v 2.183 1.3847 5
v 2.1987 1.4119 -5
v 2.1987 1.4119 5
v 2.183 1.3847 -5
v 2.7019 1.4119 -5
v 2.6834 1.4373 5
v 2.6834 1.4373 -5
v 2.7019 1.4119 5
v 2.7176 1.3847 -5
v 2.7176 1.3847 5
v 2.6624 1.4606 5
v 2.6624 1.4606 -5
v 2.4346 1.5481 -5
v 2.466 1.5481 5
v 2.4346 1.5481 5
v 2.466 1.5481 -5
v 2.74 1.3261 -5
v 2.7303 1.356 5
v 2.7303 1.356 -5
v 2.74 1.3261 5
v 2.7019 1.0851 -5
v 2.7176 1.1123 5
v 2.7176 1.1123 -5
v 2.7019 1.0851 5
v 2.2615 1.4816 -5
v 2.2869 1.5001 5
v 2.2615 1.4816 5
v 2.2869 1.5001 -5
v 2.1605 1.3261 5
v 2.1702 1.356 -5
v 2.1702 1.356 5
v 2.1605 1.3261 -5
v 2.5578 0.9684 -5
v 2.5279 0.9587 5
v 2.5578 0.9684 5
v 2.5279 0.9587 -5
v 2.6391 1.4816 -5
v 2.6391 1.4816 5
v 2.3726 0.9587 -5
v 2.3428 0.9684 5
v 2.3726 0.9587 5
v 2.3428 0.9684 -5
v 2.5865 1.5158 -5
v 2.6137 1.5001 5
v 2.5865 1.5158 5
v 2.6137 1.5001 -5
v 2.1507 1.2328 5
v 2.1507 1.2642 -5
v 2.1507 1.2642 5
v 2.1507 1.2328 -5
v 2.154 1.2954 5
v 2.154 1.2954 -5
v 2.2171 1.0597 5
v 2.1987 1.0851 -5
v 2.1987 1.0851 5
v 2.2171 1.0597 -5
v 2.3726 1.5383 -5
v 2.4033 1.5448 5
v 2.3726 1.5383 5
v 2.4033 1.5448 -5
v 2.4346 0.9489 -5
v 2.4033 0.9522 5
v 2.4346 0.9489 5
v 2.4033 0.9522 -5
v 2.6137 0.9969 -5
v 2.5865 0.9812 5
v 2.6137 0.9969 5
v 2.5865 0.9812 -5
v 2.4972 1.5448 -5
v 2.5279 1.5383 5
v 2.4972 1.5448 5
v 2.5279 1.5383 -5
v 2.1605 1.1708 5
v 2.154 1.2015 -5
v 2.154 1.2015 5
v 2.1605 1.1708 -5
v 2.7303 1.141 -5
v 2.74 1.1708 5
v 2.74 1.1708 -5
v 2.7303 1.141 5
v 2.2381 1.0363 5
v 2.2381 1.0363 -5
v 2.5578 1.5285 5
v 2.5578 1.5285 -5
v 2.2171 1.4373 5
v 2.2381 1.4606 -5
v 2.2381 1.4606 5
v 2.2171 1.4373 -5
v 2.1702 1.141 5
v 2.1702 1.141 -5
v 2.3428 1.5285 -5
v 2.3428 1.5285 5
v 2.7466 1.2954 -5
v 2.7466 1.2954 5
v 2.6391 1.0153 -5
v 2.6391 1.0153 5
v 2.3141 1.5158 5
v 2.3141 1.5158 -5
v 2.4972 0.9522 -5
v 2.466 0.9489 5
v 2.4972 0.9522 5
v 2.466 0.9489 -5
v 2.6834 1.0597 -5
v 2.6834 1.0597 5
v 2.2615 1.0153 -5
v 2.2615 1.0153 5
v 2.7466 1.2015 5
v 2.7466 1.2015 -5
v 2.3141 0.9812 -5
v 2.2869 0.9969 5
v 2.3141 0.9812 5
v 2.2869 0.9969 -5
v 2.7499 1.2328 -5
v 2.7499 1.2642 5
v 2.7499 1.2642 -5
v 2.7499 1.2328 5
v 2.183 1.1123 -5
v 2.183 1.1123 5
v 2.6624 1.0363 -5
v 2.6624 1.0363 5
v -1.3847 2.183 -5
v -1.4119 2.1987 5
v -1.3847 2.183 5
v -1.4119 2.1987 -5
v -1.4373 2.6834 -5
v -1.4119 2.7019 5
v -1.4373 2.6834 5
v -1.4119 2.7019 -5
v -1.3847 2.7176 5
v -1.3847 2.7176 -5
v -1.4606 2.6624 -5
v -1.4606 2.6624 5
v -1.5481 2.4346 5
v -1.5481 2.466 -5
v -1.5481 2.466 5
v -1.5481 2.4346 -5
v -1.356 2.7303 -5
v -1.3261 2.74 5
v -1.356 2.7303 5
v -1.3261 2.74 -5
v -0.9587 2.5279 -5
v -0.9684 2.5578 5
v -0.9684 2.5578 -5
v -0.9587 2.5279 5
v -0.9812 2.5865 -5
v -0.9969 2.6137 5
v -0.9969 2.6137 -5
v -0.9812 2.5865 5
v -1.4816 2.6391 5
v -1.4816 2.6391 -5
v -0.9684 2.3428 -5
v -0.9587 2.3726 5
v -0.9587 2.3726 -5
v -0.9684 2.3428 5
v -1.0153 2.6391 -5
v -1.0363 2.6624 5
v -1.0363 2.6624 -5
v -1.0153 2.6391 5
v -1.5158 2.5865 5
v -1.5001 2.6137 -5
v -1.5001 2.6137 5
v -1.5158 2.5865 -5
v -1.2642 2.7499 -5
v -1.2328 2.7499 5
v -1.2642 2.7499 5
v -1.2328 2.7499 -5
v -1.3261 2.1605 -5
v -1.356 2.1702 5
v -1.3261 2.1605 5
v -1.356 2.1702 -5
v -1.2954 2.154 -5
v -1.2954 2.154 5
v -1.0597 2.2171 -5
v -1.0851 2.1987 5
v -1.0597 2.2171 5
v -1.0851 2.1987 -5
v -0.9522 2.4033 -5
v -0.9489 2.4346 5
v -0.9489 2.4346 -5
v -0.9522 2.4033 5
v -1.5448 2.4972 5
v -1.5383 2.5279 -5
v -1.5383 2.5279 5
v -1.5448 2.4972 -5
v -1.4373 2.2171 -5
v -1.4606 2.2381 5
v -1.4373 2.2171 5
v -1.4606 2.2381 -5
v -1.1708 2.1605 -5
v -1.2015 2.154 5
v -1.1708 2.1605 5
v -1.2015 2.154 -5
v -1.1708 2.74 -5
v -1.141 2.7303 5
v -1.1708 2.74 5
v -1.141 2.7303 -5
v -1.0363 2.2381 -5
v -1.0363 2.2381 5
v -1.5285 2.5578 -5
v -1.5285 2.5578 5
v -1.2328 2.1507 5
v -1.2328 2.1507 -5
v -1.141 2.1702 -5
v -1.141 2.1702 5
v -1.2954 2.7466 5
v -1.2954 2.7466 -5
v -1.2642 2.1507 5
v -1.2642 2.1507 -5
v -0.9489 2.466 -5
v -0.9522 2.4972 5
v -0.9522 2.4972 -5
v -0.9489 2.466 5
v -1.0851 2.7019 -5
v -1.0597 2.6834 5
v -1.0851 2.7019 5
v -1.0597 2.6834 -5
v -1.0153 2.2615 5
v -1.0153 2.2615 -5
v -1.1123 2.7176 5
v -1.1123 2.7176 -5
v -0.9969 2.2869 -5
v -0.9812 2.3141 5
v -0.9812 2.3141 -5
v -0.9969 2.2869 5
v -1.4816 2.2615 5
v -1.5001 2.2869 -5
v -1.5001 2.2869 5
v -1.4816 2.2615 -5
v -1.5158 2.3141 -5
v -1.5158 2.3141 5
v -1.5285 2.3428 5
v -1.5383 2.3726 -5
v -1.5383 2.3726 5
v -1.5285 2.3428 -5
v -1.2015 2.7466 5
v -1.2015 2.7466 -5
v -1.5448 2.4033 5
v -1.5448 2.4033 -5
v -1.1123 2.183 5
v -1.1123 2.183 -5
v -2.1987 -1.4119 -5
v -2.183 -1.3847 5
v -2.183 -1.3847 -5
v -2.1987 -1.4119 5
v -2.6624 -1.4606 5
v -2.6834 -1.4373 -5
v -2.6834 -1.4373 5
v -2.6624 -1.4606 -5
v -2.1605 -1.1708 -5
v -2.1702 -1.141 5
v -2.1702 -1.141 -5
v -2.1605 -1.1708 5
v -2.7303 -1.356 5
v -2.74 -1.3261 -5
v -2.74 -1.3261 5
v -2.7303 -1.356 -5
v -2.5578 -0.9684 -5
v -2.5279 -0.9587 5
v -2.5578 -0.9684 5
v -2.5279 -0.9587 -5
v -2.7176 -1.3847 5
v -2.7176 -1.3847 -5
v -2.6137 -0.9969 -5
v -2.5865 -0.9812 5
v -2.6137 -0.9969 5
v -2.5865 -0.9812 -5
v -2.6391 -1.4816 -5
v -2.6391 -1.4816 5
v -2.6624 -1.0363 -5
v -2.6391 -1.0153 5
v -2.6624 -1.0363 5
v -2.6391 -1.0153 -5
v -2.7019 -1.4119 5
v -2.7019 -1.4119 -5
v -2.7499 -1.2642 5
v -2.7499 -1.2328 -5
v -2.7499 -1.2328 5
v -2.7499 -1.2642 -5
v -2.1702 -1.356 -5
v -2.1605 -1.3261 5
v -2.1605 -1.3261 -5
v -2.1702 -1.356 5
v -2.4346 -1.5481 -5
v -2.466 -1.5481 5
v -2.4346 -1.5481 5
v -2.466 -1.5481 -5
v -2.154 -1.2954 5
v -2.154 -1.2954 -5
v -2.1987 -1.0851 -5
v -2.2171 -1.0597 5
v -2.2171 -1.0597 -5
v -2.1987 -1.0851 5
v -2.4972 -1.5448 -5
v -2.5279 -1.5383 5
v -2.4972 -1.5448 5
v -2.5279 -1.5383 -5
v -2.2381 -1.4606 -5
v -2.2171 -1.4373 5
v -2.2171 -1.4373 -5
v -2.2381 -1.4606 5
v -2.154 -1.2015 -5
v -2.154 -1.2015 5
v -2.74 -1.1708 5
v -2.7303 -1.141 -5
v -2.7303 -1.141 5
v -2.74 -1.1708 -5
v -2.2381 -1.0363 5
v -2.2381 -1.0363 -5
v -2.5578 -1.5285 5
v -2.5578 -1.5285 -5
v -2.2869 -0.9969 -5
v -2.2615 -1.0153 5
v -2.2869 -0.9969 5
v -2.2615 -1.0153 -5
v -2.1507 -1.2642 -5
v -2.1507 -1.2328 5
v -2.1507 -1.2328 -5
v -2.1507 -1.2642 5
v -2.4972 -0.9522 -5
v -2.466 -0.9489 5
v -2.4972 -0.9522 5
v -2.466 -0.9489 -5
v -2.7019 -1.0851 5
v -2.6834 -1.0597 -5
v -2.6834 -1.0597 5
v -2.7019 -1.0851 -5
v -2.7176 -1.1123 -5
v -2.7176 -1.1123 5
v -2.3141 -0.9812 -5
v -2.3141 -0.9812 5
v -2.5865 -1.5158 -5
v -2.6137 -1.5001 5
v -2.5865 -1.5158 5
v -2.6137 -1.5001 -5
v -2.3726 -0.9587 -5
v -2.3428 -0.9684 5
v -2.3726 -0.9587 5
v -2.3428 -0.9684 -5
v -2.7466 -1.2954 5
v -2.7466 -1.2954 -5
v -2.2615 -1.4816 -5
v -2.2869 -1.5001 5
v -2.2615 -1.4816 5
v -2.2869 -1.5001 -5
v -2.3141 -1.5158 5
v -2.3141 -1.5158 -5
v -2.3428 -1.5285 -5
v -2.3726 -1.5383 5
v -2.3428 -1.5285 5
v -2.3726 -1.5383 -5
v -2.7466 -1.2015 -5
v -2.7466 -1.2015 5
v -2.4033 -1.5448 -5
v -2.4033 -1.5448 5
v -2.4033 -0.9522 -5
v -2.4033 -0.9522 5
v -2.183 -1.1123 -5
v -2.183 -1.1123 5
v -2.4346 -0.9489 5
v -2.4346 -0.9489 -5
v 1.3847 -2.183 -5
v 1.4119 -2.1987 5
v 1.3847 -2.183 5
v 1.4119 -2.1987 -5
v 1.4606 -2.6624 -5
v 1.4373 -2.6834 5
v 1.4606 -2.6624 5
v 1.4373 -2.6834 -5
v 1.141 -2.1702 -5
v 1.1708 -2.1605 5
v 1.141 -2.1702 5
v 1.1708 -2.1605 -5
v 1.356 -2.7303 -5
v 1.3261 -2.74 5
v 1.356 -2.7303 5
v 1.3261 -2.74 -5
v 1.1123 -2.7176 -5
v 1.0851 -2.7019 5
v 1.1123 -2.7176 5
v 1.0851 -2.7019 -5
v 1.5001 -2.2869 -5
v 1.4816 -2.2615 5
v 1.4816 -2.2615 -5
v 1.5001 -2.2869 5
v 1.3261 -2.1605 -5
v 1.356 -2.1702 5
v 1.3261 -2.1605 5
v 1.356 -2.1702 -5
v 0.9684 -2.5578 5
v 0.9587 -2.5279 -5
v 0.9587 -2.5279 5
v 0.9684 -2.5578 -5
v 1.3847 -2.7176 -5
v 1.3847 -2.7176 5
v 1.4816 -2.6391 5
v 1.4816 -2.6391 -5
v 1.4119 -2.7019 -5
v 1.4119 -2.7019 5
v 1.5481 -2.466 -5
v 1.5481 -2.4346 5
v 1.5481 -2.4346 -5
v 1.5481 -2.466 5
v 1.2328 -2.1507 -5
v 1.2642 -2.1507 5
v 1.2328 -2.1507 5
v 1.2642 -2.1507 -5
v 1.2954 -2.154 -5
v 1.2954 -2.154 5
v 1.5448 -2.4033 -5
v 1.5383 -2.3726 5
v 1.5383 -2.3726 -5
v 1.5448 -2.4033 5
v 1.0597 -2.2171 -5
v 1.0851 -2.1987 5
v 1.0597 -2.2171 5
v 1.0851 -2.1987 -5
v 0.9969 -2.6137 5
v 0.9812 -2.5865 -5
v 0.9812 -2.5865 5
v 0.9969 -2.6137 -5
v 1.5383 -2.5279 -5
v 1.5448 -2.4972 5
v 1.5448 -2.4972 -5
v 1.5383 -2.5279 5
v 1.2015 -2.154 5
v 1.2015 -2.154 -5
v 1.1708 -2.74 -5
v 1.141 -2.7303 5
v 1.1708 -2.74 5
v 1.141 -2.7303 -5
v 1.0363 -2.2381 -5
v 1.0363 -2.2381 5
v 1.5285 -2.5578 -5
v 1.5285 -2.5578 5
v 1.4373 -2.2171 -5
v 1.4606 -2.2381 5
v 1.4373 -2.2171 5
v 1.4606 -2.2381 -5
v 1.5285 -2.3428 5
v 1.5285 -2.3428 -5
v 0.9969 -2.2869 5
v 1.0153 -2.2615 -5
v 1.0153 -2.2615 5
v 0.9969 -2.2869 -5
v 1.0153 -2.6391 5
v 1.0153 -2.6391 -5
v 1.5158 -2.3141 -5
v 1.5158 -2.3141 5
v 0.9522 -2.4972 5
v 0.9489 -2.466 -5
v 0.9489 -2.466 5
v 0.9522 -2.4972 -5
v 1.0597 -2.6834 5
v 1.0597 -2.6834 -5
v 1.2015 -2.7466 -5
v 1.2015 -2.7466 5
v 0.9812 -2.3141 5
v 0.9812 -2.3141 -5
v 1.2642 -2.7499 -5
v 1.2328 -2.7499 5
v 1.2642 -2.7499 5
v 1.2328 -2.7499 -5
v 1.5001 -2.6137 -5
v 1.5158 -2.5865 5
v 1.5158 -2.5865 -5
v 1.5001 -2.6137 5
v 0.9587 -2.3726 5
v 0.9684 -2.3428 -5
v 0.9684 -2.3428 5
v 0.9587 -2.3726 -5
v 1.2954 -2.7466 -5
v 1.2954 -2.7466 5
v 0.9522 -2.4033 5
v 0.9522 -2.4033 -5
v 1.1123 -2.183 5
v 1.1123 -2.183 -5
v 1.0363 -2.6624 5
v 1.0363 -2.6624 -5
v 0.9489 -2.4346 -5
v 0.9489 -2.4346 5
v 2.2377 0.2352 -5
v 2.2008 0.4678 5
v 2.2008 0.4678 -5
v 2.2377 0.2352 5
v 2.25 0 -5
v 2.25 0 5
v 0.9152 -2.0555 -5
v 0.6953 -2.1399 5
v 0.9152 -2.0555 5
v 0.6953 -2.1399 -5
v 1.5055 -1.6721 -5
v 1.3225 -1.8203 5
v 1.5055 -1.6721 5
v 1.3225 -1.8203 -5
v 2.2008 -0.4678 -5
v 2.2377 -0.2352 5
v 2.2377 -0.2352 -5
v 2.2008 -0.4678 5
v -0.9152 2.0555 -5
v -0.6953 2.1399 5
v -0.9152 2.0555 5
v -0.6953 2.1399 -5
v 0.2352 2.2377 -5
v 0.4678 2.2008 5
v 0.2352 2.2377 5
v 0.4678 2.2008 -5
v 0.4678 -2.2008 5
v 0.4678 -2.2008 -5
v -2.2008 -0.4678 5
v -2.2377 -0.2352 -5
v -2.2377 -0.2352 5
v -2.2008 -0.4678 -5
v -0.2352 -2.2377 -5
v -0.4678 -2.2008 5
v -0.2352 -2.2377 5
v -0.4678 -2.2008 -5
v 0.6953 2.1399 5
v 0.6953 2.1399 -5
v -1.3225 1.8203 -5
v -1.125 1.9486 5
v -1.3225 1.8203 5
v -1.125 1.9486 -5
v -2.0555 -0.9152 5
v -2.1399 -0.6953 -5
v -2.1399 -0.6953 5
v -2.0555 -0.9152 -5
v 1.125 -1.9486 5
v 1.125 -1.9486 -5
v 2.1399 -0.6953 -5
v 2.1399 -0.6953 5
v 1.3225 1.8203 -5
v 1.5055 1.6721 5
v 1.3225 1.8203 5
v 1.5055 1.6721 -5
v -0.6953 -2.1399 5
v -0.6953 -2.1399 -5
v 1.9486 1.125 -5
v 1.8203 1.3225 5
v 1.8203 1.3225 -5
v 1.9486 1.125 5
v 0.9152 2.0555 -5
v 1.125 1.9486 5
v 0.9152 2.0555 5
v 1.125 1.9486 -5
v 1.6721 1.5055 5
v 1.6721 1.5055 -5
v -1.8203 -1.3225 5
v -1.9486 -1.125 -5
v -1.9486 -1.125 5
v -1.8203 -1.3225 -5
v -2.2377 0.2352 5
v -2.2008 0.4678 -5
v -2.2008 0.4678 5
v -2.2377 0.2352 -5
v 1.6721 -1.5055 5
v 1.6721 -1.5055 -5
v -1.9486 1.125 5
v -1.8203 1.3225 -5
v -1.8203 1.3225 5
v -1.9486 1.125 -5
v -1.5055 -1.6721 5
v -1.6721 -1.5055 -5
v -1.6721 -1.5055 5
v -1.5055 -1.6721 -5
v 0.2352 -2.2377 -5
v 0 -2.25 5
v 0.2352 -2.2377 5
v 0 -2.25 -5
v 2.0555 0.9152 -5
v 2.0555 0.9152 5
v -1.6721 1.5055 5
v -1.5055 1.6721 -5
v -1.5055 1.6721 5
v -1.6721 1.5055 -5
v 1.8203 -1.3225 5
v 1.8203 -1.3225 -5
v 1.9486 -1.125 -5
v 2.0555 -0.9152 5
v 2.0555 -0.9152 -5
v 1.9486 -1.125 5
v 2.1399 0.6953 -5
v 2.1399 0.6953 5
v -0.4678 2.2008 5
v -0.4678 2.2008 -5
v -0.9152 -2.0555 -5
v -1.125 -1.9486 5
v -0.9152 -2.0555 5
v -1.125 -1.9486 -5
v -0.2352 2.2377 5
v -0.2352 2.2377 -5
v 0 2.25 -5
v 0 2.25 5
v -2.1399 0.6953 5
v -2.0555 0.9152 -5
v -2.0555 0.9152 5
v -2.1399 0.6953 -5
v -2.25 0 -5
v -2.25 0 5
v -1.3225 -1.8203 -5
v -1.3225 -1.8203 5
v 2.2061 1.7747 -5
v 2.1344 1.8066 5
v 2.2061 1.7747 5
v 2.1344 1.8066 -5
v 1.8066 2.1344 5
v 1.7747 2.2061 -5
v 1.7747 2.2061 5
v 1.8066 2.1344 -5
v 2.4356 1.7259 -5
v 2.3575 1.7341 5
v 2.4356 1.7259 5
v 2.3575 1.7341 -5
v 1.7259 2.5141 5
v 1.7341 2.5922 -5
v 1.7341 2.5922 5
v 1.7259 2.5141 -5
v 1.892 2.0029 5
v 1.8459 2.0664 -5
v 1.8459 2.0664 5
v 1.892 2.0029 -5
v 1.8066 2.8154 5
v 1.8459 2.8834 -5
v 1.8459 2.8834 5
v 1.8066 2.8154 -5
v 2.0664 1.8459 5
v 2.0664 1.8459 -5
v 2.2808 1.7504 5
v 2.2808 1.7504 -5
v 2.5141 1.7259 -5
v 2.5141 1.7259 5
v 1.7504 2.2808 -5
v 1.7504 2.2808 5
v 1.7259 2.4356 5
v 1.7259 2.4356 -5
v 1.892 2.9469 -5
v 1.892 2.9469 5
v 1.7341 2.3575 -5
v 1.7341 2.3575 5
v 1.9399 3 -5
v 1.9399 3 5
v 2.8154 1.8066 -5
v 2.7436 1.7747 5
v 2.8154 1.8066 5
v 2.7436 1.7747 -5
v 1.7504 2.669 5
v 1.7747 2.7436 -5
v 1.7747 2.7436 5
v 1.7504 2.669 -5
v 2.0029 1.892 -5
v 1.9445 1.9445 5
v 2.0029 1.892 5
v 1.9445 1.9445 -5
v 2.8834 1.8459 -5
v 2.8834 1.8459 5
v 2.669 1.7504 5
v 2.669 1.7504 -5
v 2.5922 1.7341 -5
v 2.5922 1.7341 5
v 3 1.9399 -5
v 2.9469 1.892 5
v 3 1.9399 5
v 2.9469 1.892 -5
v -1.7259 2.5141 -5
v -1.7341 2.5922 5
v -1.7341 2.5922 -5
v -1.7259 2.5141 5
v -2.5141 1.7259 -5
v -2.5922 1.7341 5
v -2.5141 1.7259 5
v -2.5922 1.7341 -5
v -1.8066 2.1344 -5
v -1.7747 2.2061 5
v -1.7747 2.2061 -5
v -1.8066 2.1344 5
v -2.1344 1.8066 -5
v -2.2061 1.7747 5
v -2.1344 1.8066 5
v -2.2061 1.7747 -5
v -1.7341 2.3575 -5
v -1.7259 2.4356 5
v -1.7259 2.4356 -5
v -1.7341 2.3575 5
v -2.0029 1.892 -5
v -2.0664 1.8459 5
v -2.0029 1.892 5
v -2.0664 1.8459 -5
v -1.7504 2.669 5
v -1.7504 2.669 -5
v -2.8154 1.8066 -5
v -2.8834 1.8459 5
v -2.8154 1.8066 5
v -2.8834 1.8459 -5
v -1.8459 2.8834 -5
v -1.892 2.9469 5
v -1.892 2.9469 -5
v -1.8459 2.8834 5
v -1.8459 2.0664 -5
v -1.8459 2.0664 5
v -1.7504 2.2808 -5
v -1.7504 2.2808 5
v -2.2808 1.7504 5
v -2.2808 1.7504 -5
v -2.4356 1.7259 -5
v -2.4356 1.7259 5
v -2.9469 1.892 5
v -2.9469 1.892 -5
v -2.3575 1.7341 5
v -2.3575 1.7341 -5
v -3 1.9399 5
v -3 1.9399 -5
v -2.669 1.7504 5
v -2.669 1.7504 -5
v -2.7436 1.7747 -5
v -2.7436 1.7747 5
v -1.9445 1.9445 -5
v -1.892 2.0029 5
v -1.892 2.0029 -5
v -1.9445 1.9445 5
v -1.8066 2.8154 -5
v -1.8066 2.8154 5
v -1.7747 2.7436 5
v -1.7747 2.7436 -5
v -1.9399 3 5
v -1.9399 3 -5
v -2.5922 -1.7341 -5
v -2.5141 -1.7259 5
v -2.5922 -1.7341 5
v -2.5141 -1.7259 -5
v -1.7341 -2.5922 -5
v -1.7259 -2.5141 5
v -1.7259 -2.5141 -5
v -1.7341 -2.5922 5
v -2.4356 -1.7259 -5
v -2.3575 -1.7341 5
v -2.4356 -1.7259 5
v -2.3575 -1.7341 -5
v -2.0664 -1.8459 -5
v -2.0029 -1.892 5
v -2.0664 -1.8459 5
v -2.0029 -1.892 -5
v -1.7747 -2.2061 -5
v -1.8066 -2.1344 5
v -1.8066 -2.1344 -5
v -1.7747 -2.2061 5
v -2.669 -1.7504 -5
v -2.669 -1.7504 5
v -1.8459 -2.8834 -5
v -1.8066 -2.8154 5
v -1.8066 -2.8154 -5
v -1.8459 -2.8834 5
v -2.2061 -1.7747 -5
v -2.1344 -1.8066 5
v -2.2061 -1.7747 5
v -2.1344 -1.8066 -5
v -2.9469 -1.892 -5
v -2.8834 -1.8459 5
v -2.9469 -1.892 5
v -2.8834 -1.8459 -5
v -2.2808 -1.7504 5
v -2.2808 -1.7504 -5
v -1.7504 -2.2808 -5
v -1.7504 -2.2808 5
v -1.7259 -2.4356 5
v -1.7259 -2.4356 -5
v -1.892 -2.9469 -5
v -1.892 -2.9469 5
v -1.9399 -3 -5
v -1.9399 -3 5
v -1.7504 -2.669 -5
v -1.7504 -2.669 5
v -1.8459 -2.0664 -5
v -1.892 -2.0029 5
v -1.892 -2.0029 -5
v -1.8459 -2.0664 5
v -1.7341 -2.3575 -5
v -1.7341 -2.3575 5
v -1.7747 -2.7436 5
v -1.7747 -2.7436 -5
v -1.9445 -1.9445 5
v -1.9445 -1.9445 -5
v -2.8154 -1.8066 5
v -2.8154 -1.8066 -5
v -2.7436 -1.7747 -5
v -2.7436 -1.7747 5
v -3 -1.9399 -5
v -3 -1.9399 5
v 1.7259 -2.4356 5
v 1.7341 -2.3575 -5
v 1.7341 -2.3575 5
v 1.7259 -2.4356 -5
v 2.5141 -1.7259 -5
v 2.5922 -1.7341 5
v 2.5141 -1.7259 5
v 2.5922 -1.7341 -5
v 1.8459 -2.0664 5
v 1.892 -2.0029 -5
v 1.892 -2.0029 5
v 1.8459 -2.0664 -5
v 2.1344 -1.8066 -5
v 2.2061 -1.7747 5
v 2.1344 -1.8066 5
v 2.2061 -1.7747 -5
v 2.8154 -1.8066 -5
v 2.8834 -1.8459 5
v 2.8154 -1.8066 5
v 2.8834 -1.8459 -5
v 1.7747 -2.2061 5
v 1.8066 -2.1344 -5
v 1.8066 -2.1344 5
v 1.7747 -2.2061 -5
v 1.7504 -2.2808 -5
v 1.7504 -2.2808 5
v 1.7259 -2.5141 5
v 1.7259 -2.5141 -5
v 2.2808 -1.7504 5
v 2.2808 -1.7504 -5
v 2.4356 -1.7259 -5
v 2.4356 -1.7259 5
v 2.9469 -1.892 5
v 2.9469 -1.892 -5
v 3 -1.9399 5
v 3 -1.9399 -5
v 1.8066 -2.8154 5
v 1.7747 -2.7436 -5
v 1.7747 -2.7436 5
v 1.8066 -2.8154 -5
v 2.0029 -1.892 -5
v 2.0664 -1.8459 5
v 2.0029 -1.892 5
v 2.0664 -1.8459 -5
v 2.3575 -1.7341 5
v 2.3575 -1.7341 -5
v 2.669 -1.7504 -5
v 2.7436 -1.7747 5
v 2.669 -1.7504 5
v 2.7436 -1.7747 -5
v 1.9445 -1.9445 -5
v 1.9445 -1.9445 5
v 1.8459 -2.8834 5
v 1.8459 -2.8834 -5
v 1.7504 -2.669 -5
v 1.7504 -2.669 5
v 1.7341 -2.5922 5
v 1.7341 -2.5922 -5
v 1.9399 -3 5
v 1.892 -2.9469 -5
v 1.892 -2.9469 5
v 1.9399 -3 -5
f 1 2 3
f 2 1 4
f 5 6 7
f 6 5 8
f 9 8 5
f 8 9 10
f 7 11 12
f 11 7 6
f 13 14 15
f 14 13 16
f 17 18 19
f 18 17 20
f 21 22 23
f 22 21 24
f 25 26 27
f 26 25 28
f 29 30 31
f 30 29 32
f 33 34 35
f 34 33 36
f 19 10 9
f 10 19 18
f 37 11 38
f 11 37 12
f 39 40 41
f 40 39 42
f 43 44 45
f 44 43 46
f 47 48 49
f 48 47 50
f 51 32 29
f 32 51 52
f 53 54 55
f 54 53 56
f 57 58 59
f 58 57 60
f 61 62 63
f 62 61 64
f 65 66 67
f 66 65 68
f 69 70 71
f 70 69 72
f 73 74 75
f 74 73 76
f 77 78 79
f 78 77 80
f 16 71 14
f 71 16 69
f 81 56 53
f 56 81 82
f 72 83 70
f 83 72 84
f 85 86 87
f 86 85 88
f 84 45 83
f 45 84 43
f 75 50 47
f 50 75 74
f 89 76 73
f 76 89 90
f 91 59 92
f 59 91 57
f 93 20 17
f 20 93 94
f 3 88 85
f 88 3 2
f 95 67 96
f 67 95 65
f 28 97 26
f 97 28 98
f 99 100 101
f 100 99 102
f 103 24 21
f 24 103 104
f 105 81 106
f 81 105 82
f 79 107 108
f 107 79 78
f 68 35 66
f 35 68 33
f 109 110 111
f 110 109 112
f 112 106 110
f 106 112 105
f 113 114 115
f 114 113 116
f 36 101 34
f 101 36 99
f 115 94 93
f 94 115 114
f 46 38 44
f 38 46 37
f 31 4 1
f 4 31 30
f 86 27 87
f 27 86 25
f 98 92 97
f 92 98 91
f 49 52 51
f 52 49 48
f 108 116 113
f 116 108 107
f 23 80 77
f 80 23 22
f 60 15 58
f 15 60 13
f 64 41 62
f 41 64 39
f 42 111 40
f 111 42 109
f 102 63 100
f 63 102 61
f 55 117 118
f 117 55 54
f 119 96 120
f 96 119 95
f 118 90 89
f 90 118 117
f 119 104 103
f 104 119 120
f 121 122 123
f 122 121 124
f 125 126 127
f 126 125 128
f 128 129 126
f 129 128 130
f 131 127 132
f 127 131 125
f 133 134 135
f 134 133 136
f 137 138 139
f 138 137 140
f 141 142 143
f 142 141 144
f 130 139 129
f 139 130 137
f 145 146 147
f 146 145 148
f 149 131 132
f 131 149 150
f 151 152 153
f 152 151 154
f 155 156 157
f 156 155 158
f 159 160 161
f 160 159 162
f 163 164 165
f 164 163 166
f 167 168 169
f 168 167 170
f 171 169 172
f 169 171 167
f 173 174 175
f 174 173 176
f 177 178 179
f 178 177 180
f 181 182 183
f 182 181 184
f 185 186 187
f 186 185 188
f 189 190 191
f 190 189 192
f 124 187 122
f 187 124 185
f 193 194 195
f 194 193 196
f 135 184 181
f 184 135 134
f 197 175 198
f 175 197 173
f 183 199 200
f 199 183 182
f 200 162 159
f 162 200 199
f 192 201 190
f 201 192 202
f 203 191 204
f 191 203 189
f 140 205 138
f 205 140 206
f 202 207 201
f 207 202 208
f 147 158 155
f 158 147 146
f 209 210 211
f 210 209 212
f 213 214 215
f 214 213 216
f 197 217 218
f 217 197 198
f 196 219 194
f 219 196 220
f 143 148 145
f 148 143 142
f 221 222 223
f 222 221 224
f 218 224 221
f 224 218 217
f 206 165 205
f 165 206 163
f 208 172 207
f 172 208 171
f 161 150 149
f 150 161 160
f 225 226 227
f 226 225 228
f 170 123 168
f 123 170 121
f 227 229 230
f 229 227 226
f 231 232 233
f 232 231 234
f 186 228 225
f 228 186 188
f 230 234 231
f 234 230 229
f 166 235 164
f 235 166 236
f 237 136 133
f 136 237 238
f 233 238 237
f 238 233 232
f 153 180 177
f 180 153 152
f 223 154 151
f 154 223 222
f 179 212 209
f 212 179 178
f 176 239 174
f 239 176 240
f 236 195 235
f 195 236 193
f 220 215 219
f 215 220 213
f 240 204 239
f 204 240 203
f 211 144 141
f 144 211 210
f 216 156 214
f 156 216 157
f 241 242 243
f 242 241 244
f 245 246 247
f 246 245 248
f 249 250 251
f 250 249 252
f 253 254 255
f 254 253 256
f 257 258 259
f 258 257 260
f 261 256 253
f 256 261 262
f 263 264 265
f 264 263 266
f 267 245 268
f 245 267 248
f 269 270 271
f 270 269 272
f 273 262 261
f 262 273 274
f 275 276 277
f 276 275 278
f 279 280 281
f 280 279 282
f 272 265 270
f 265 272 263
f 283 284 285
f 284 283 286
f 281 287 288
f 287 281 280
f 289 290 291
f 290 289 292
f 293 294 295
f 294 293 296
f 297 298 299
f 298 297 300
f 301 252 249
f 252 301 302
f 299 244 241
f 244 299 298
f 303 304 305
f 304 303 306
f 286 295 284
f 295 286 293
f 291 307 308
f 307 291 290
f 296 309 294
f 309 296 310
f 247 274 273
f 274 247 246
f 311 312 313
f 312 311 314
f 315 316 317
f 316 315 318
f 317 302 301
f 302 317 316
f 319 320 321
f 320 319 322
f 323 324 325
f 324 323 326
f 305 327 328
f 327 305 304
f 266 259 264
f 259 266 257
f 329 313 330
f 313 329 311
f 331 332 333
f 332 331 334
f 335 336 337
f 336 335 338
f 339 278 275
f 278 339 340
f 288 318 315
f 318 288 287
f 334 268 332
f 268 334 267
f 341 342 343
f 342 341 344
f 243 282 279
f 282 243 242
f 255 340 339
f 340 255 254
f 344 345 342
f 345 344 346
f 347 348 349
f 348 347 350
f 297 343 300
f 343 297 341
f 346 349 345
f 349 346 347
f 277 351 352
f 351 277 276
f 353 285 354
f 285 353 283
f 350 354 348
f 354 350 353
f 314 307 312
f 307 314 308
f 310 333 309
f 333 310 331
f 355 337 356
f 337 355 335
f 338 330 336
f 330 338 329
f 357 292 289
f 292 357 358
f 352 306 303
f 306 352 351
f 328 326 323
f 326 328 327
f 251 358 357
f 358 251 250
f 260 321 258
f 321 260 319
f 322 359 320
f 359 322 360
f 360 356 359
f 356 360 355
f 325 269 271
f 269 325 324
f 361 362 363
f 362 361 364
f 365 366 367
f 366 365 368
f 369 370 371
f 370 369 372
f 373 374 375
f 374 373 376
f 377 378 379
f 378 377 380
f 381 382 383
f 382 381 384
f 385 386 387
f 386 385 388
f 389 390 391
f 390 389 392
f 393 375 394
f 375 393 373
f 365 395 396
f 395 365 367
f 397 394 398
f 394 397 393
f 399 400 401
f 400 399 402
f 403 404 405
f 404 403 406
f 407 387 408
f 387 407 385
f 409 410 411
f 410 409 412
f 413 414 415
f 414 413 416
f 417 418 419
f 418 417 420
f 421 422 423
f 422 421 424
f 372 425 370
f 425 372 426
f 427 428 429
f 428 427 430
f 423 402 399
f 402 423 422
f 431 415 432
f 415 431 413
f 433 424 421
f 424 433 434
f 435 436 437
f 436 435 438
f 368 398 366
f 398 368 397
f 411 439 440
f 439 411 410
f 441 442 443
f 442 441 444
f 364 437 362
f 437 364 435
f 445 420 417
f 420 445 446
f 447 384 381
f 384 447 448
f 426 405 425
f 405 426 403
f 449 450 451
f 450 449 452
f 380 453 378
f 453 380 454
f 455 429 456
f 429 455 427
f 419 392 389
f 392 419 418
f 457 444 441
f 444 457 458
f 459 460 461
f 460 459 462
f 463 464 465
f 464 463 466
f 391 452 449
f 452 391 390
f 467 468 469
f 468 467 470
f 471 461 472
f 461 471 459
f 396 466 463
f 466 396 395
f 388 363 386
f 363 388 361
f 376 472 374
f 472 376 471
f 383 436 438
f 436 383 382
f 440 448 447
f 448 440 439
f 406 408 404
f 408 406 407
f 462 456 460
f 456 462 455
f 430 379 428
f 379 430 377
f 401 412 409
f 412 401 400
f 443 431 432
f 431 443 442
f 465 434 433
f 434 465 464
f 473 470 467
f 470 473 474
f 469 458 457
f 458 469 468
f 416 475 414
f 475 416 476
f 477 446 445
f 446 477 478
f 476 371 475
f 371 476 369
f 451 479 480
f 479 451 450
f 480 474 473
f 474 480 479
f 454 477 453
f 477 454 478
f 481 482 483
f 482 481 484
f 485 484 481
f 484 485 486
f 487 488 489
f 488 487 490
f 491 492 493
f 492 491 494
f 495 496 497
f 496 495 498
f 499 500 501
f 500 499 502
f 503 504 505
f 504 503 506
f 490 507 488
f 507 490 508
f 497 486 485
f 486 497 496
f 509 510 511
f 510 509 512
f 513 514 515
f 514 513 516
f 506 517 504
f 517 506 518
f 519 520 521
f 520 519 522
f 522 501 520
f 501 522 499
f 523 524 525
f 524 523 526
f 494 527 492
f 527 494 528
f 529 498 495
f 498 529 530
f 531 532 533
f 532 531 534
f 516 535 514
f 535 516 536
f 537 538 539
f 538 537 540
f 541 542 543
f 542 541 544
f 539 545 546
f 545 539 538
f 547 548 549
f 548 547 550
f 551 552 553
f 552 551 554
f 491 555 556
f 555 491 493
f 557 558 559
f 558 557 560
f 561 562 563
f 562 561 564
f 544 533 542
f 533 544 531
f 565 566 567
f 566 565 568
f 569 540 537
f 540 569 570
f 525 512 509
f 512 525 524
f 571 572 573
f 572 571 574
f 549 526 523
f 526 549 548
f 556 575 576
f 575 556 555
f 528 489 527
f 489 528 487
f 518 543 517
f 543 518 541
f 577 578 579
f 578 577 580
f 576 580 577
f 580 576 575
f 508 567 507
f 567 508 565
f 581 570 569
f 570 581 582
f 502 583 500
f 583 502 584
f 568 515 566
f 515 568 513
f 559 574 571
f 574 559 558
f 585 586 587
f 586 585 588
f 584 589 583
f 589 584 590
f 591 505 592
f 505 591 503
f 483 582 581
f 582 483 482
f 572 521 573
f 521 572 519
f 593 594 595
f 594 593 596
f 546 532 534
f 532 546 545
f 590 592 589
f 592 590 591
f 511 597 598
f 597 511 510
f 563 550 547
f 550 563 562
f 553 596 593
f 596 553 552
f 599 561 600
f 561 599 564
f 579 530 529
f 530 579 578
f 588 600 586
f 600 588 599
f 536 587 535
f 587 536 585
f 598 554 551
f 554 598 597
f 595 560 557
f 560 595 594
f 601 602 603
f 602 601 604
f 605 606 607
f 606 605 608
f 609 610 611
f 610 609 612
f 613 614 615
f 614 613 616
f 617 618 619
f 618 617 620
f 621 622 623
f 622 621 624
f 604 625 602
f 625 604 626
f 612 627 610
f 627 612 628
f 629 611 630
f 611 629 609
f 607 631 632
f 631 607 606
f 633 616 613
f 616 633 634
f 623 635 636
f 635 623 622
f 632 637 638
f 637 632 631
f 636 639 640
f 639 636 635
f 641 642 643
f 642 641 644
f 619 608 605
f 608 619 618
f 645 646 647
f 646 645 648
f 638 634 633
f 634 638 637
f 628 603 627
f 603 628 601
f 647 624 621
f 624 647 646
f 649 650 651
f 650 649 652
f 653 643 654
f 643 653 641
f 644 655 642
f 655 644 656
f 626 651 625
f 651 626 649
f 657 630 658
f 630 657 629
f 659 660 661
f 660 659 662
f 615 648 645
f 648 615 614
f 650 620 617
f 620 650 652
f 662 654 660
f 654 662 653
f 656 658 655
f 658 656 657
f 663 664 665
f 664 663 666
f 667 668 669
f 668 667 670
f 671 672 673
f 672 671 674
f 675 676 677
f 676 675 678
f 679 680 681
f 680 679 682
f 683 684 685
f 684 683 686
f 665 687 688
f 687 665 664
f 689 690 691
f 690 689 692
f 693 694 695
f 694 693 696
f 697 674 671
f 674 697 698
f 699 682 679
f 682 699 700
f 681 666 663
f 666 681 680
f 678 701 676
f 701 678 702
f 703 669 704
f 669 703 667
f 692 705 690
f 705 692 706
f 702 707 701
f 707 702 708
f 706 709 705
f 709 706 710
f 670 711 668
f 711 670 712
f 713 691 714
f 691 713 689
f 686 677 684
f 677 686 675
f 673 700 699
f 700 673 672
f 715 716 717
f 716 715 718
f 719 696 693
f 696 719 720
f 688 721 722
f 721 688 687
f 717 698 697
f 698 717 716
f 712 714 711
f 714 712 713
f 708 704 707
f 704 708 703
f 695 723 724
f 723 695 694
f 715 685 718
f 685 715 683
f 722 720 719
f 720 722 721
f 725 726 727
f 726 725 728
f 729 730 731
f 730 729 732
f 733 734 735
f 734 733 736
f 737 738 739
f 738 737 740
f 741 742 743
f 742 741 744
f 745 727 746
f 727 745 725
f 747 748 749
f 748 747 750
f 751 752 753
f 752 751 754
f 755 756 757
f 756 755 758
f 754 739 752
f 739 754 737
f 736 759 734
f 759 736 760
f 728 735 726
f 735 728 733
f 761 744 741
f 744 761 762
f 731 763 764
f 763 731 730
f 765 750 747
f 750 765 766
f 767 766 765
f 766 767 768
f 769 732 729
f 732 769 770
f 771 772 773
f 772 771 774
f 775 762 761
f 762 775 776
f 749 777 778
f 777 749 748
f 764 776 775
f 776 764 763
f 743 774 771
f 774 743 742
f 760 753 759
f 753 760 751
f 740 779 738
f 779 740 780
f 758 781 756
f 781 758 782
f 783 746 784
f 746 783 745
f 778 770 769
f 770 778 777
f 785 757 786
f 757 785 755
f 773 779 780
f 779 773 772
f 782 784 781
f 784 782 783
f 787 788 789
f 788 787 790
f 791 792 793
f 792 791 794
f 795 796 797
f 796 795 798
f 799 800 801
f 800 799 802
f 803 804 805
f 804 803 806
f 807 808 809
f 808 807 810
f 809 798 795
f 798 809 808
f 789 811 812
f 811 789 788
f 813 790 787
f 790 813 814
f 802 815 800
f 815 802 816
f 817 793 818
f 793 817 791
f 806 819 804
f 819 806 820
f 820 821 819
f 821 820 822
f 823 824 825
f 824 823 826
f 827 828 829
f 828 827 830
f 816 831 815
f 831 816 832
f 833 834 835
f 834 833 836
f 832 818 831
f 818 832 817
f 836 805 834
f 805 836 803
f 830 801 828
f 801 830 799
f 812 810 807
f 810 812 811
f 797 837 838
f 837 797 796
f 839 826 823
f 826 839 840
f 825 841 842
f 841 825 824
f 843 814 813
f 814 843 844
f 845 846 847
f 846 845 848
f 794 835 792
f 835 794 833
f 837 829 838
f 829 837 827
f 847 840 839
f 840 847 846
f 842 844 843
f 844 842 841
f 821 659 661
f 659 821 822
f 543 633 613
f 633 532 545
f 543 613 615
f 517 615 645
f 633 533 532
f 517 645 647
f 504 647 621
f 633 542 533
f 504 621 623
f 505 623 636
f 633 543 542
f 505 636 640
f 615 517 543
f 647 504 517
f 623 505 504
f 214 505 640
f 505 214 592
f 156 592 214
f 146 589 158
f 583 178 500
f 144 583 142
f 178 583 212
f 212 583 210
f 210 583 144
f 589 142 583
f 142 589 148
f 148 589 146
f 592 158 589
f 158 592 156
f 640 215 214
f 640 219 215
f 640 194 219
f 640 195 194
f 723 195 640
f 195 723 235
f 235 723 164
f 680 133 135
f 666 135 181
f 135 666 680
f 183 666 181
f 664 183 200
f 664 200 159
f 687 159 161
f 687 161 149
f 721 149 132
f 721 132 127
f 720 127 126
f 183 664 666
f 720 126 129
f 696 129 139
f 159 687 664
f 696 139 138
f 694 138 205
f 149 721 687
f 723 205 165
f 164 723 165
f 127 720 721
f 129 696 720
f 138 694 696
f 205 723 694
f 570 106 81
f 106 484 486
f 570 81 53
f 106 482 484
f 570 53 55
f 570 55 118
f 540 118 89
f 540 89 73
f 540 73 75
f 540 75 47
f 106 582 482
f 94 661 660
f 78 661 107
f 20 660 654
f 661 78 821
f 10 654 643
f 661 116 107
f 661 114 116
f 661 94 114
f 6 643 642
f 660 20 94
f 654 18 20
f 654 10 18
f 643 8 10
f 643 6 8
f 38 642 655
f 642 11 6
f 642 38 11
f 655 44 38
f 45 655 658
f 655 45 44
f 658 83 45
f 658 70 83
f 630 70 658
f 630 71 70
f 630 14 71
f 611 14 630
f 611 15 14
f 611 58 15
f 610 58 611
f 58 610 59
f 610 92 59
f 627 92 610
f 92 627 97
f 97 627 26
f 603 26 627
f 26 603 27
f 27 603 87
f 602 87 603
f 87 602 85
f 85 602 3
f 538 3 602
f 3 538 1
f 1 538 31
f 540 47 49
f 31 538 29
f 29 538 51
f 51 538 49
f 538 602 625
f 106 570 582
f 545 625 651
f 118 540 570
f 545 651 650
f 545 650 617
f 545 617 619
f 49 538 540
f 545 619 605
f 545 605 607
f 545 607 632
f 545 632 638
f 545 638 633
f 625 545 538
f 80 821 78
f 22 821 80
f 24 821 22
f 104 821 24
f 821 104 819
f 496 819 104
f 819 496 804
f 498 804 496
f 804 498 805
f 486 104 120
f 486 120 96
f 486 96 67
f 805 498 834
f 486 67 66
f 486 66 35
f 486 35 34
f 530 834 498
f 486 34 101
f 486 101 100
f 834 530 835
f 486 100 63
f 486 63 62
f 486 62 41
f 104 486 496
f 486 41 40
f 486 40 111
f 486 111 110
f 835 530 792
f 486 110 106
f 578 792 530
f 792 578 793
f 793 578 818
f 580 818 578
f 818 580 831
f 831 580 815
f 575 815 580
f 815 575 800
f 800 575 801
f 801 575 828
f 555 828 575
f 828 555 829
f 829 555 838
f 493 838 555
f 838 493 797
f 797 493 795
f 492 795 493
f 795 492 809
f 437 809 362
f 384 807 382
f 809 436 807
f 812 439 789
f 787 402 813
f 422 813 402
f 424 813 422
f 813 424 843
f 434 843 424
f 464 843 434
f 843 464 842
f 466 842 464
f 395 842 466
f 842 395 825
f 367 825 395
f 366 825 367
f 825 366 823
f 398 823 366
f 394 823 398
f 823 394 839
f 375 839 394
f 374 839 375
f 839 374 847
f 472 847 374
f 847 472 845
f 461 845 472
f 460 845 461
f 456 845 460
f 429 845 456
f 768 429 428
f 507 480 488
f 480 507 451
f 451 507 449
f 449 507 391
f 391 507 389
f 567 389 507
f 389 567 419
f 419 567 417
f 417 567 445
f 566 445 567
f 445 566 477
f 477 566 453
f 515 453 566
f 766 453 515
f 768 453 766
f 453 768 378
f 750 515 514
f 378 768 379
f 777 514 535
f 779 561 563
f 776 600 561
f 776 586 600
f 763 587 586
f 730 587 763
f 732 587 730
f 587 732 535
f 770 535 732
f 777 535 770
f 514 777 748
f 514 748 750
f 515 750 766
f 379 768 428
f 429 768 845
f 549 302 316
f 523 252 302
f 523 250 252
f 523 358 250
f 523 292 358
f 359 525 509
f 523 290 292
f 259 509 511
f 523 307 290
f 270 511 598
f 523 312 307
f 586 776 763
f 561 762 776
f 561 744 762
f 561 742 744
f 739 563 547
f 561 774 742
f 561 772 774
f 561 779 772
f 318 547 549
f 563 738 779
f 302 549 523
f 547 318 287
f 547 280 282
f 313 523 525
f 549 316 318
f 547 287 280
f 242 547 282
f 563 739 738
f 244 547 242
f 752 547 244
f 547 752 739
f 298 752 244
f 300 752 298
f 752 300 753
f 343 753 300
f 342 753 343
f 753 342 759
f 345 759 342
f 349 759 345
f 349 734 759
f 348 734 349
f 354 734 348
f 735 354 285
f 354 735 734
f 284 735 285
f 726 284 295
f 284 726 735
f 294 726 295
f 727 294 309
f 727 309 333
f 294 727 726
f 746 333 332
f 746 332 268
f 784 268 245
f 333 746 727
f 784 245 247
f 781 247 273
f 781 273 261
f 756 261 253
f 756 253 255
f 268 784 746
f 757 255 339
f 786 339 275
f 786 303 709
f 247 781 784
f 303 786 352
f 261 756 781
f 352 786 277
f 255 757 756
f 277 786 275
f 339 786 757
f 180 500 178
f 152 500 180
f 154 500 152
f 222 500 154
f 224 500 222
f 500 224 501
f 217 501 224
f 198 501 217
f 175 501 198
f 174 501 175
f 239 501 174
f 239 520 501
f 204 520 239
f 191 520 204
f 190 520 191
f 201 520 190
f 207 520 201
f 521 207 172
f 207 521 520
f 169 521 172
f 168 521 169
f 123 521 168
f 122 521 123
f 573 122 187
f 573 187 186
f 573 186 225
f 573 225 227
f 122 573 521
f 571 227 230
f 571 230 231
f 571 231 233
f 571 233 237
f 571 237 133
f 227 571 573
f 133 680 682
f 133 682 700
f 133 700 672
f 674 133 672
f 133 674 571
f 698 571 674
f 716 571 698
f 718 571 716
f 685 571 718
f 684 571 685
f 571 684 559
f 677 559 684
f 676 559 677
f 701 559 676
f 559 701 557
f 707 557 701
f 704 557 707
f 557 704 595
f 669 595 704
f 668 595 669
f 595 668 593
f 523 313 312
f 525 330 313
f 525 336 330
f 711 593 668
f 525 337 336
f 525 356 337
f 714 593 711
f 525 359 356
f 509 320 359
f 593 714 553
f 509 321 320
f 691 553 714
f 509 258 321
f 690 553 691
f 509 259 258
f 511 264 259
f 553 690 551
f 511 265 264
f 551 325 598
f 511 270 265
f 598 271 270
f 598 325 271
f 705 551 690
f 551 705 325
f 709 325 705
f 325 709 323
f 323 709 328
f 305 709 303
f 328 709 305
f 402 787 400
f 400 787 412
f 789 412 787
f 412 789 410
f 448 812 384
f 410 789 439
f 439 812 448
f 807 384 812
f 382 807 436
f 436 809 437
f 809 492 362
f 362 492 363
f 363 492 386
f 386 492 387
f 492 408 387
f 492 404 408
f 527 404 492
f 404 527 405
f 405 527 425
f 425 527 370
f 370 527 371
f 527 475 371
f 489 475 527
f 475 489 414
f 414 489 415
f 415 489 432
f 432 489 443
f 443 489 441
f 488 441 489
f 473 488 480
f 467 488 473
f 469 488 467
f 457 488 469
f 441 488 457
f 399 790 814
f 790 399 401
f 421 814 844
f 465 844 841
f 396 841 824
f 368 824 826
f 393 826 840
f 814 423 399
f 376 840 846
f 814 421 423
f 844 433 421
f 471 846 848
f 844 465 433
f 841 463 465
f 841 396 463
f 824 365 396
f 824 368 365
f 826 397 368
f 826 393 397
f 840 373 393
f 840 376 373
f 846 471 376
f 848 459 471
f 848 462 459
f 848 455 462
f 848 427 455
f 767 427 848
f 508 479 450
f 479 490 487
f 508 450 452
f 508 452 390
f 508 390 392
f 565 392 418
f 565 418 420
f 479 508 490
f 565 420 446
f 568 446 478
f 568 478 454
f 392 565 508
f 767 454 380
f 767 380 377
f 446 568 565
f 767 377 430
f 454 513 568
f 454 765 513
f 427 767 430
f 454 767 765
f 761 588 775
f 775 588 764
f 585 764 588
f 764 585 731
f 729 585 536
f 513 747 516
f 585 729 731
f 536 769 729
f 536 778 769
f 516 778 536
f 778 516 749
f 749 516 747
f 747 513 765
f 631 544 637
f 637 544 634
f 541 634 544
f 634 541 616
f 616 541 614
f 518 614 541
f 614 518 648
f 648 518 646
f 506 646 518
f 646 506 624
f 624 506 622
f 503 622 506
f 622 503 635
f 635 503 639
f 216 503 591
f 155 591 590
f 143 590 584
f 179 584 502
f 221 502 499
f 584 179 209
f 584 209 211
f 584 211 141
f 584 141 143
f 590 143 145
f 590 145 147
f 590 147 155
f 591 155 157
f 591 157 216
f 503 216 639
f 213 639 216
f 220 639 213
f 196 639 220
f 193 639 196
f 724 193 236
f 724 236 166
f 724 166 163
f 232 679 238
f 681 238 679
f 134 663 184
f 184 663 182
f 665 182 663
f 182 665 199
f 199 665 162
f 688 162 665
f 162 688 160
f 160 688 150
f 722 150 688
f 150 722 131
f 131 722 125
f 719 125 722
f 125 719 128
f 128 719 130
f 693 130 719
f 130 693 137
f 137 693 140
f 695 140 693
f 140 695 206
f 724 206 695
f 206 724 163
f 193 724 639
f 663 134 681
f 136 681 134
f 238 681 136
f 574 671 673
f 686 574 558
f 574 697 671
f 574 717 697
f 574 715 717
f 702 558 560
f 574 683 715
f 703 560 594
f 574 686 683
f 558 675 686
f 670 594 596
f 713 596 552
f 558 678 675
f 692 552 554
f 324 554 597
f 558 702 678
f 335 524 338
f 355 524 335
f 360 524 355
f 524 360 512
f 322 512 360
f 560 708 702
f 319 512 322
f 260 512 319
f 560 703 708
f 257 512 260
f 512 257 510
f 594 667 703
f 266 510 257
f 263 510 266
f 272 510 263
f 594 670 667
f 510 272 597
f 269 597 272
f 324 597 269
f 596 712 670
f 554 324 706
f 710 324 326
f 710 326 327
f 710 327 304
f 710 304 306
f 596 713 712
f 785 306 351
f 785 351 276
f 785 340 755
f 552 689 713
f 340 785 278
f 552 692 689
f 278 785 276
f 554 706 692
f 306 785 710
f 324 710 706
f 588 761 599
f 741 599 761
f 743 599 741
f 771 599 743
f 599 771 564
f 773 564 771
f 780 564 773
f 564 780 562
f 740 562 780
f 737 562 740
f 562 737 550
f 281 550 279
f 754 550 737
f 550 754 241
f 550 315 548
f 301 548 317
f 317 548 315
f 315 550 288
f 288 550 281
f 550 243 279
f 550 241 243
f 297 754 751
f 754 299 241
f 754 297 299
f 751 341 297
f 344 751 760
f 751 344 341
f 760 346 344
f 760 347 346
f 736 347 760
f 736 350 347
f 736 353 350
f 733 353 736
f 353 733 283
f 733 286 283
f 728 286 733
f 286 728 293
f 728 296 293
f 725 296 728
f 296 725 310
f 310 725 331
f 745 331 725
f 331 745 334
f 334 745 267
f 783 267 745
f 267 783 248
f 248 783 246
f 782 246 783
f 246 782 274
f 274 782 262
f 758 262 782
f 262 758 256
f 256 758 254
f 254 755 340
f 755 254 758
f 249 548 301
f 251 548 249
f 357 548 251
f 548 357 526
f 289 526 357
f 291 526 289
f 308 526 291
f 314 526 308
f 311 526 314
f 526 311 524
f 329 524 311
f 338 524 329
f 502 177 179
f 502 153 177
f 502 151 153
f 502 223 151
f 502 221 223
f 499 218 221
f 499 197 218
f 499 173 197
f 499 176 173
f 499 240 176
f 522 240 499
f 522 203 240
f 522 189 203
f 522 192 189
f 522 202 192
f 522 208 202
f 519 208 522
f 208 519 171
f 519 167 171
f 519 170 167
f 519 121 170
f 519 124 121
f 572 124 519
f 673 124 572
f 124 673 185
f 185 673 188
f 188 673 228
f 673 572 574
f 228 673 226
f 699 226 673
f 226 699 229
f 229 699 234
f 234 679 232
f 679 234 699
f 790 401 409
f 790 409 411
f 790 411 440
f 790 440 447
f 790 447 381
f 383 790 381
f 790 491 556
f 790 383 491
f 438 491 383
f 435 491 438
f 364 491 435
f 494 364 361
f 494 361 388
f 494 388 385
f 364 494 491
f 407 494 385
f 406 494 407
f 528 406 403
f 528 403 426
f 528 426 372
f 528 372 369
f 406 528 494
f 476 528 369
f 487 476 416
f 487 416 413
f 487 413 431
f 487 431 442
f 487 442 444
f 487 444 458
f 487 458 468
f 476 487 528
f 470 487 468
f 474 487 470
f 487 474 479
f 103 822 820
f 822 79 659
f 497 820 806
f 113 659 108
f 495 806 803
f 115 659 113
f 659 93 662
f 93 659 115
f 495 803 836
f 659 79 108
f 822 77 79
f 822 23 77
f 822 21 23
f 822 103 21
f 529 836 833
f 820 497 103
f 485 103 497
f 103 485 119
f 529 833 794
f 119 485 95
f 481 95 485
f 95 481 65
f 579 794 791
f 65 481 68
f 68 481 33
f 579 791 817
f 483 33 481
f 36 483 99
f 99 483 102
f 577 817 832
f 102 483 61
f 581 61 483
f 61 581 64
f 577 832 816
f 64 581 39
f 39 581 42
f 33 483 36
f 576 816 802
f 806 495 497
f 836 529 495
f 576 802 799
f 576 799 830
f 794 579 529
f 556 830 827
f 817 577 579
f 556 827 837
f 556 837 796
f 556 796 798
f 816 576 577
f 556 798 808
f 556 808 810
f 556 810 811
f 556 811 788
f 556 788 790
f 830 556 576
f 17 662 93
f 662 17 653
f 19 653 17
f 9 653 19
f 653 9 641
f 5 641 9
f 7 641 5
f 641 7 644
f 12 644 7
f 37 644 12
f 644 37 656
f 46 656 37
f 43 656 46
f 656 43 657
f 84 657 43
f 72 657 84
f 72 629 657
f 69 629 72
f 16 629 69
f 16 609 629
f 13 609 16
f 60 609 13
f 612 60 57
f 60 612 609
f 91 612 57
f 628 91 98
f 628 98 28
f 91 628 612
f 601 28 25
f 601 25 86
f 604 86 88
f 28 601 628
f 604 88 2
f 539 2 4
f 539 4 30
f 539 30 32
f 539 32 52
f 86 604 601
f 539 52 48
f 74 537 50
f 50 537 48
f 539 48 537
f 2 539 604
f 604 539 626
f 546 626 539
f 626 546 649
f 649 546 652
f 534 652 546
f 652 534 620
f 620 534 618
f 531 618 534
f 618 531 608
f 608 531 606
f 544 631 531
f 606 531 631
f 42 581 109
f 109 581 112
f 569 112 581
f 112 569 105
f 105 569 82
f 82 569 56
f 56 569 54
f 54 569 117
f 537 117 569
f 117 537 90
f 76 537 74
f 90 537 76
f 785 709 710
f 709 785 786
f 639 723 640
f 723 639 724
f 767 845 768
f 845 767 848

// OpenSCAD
res = 60;

module cys(r, h, d, a) {
  rotate([0, 0, a])
  translate([d, 0, 0])
  cylinder(r = r, h = h, center = true, $fn = res);
}

difference() {
  cube(size = [6, 6, 10], center = true);

  union() {
    cys(0.3, 20, 2.75, 27);
    cys(0.3, 20, 2.75, 27 + 90);
    cys(0.3, 20, 2.75, 27 + 180);
    cys(0.3, 20, 2.75, 27 + 270);
    
    cys(2.25, 20, 0, 0);
    
    cys(0.75, 20, 3.5, 45);
    cys(0.75, 20, 3.5, 45 + 90);
    cys(0.75, 20, 3.5, 45 + 180);
    cys(0.75, 20, 3.5, 45 + 270);
  }
}
